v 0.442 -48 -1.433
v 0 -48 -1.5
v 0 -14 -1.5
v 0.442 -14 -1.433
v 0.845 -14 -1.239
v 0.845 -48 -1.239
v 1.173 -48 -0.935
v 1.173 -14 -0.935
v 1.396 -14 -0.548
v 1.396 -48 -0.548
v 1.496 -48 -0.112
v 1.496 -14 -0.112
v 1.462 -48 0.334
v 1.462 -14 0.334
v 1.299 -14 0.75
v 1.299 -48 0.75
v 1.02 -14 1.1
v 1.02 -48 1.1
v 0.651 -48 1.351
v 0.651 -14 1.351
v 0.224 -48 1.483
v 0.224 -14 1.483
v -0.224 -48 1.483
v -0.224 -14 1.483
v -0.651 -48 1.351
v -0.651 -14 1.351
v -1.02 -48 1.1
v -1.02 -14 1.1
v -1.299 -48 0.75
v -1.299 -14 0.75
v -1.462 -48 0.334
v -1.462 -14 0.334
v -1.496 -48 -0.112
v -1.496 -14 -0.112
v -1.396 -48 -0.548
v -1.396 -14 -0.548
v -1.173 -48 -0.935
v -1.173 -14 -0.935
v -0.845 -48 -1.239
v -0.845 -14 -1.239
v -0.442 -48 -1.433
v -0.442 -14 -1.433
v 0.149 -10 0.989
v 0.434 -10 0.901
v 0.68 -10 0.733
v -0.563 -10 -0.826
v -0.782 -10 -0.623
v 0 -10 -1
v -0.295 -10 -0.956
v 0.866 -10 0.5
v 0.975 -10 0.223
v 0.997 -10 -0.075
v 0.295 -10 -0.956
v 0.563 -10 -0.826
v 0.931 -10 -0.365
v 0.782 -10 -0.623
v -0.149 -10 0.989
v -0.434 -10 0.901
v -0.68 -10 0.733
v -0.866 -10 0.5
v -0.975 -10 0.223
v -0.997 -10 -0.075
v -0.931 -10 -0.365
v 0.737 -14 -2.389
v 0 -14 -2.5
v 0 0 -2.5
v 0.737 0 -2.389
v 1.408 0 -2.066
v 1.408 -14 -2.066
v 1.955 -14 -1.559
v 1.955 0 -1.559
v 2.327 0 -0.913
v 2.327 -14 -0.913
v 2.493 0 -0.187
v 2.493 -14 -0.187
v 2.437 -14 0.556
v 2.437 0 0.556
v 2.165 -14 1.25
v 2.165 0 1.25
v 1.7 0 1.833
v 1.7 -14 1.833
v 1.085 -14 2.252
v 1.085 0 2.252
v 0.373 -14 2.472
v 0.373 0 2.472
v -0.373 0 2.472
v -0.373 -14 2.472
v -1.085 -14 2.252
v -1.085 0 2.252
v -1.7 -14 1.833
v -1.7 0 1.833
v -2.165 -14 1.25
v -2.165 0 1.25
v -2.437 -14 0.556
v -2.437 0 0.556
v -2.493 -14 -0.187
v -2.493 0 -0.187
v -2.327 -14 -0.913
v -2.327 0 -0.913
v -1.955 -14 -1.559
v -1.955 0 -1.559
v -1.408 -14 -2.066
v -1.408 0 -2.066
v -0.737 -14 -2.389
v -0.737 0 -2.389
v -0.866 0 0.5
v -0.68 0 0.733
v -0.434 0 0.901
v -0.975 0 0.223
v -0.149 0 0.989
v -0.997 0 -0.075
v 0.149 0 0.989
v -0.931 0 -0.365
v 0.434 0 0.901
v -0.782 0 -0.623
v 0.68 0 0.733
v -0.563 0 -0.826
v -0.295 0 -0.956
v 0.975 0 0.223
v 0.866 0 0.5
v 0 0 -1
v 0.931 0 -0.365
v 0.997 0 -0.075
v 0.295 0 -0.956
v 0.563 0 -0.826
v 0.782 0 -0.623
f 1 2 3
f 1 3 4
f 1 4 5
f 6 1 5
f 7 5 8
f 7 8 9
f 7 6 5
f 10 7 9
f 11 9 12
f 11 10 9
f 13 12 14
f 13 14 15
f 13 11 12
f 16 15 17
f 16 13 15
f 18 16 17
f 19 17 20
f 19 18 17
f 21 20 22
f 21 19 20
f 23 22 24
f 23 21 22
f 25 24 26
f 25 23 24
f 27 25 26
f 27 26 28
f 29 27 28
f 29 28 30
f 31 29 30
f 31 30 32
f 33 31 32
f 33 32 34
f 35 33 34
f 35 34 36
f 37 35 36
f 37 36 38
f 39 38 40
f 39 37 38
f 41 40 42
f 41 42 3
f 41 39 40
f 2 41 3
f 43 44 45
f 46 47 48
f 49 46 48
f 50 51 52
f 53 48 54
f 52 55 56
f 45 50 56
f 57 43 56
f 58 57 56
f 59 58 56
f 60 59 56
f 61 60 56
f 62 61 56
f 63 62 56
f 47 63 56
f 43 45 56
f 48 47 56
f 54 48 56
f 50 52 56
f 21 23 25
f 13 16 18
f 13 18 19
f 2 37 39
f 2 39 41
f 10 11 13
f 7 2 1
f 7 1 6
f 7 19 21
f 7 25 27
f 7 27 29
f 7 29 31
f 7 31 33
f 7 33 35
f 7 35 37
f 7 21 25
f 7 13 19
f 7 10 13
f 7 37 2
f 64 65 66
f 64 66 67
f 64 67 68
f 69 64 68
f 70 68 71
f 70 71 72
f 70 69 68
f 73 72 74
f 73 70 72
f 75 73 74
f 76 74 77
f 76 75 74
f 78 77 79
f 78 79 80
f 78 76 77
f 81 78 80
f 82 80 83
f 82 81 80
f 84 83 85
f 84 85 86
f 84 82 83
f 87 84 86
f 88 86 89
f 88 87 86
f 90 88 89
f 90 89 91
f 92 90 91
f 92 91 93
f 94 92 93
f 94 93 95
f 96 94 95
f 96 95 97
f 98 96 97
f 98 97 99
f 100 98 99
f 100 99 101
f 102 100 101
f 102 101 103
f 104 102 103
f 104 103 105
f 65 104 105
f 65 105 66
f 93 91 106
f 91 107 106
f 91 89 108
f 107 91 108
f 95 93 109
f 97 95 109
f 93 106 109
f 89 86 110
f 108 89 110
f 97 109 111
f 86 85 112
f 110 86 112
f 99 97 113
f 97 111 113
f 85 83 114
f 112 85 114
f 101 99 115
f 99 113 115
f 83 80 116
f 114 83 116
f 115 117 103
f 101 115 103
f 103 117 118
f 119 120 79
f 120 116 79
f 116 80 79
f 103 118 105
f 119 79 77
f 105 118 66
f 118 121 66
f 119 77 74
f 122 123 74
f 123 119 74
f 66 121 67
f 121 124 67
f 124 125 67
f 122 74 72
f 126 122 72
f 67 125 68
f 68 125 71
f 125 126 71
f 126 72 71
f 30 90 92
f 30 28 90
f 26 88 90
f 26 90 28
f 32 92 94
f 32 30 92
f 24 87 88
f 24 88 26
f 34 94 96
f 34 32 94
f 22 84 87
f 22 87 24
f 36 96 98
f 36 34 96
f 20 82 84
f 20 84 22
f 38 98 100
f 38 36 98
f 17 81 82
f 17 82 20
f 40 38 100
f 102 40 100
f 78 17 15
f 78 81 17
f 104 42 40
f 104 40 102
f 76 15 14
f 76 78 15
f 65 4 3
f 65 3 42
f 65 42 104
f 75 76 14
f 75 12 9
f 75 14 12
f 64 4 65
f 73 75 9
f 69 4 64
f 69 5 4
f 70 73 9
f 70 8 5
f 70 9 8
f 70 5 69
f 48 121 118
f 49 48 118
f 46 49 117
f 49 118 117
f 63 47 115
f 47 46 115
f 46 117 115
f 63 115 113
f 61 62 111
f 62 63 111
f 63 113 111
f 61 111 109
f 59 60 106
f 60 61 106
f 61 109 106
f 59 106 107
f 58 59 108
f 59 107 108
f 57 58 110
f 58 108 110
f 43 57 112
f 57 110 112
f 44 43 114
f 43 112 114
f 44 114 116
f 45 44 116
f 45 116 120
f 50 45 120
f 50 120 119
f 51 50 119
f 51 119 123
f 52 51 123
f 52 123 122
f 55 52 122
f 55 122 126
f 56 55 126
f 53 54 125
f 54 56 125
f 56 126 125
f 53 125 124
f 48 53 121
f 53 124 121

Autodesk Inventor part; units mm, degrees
ref_plane "YZ Plane" through (0, 0, 0) normal (1, 0, 0) x (0, 1, 0)
ref_plane "XZ Plane" through (0, 0, 0) normal (0, 1, 0) x (-1, 0, 0)
ref_plane "XY Plane" through (0, 0, 0) normal (0, 0, 1) x (1, 0, 0)
sketch "Sketch1" plane through (0, 0, 0) normal (1, 0, 0) x (0, 1, 0)
  line L0 (0, 0) -> (-48, 0)
  line L1 (-10, 0) -> (-10, -1)
  line L2 (-10, -1) -> (0, -1)
  line L3 (0, -1) -> (0, -2.5)
  line L4 (0, -2.5) -> (-14, -2.5)
  line L5 (-14, -2.5) -> (-14, -1.5)
  line L6 (-14, -1.5) -> (-48, -1.5)
  line L7 (-48, -1.5) -> (-48, 0)
  point P0 (-10, -0.5)
  point P1 (-14, -2)
  dimension "d0" = 3
  dimension "d1" = 2
  dimension "d2" = 5
  dimension "d3" = 14
  dimension "d4" = 10
  dimension "d6" = 34
revolve "Revolution1" add sketch "Sketch1" angle 360 about axis through (0, 0, 0) along (0, -1, 0)
thread "Thread1" size "M3x0.5" class "6g" standard "ANSI Metric M Profile" length 5
properties part number "041" material "Stainless Steel, Austenitic"
